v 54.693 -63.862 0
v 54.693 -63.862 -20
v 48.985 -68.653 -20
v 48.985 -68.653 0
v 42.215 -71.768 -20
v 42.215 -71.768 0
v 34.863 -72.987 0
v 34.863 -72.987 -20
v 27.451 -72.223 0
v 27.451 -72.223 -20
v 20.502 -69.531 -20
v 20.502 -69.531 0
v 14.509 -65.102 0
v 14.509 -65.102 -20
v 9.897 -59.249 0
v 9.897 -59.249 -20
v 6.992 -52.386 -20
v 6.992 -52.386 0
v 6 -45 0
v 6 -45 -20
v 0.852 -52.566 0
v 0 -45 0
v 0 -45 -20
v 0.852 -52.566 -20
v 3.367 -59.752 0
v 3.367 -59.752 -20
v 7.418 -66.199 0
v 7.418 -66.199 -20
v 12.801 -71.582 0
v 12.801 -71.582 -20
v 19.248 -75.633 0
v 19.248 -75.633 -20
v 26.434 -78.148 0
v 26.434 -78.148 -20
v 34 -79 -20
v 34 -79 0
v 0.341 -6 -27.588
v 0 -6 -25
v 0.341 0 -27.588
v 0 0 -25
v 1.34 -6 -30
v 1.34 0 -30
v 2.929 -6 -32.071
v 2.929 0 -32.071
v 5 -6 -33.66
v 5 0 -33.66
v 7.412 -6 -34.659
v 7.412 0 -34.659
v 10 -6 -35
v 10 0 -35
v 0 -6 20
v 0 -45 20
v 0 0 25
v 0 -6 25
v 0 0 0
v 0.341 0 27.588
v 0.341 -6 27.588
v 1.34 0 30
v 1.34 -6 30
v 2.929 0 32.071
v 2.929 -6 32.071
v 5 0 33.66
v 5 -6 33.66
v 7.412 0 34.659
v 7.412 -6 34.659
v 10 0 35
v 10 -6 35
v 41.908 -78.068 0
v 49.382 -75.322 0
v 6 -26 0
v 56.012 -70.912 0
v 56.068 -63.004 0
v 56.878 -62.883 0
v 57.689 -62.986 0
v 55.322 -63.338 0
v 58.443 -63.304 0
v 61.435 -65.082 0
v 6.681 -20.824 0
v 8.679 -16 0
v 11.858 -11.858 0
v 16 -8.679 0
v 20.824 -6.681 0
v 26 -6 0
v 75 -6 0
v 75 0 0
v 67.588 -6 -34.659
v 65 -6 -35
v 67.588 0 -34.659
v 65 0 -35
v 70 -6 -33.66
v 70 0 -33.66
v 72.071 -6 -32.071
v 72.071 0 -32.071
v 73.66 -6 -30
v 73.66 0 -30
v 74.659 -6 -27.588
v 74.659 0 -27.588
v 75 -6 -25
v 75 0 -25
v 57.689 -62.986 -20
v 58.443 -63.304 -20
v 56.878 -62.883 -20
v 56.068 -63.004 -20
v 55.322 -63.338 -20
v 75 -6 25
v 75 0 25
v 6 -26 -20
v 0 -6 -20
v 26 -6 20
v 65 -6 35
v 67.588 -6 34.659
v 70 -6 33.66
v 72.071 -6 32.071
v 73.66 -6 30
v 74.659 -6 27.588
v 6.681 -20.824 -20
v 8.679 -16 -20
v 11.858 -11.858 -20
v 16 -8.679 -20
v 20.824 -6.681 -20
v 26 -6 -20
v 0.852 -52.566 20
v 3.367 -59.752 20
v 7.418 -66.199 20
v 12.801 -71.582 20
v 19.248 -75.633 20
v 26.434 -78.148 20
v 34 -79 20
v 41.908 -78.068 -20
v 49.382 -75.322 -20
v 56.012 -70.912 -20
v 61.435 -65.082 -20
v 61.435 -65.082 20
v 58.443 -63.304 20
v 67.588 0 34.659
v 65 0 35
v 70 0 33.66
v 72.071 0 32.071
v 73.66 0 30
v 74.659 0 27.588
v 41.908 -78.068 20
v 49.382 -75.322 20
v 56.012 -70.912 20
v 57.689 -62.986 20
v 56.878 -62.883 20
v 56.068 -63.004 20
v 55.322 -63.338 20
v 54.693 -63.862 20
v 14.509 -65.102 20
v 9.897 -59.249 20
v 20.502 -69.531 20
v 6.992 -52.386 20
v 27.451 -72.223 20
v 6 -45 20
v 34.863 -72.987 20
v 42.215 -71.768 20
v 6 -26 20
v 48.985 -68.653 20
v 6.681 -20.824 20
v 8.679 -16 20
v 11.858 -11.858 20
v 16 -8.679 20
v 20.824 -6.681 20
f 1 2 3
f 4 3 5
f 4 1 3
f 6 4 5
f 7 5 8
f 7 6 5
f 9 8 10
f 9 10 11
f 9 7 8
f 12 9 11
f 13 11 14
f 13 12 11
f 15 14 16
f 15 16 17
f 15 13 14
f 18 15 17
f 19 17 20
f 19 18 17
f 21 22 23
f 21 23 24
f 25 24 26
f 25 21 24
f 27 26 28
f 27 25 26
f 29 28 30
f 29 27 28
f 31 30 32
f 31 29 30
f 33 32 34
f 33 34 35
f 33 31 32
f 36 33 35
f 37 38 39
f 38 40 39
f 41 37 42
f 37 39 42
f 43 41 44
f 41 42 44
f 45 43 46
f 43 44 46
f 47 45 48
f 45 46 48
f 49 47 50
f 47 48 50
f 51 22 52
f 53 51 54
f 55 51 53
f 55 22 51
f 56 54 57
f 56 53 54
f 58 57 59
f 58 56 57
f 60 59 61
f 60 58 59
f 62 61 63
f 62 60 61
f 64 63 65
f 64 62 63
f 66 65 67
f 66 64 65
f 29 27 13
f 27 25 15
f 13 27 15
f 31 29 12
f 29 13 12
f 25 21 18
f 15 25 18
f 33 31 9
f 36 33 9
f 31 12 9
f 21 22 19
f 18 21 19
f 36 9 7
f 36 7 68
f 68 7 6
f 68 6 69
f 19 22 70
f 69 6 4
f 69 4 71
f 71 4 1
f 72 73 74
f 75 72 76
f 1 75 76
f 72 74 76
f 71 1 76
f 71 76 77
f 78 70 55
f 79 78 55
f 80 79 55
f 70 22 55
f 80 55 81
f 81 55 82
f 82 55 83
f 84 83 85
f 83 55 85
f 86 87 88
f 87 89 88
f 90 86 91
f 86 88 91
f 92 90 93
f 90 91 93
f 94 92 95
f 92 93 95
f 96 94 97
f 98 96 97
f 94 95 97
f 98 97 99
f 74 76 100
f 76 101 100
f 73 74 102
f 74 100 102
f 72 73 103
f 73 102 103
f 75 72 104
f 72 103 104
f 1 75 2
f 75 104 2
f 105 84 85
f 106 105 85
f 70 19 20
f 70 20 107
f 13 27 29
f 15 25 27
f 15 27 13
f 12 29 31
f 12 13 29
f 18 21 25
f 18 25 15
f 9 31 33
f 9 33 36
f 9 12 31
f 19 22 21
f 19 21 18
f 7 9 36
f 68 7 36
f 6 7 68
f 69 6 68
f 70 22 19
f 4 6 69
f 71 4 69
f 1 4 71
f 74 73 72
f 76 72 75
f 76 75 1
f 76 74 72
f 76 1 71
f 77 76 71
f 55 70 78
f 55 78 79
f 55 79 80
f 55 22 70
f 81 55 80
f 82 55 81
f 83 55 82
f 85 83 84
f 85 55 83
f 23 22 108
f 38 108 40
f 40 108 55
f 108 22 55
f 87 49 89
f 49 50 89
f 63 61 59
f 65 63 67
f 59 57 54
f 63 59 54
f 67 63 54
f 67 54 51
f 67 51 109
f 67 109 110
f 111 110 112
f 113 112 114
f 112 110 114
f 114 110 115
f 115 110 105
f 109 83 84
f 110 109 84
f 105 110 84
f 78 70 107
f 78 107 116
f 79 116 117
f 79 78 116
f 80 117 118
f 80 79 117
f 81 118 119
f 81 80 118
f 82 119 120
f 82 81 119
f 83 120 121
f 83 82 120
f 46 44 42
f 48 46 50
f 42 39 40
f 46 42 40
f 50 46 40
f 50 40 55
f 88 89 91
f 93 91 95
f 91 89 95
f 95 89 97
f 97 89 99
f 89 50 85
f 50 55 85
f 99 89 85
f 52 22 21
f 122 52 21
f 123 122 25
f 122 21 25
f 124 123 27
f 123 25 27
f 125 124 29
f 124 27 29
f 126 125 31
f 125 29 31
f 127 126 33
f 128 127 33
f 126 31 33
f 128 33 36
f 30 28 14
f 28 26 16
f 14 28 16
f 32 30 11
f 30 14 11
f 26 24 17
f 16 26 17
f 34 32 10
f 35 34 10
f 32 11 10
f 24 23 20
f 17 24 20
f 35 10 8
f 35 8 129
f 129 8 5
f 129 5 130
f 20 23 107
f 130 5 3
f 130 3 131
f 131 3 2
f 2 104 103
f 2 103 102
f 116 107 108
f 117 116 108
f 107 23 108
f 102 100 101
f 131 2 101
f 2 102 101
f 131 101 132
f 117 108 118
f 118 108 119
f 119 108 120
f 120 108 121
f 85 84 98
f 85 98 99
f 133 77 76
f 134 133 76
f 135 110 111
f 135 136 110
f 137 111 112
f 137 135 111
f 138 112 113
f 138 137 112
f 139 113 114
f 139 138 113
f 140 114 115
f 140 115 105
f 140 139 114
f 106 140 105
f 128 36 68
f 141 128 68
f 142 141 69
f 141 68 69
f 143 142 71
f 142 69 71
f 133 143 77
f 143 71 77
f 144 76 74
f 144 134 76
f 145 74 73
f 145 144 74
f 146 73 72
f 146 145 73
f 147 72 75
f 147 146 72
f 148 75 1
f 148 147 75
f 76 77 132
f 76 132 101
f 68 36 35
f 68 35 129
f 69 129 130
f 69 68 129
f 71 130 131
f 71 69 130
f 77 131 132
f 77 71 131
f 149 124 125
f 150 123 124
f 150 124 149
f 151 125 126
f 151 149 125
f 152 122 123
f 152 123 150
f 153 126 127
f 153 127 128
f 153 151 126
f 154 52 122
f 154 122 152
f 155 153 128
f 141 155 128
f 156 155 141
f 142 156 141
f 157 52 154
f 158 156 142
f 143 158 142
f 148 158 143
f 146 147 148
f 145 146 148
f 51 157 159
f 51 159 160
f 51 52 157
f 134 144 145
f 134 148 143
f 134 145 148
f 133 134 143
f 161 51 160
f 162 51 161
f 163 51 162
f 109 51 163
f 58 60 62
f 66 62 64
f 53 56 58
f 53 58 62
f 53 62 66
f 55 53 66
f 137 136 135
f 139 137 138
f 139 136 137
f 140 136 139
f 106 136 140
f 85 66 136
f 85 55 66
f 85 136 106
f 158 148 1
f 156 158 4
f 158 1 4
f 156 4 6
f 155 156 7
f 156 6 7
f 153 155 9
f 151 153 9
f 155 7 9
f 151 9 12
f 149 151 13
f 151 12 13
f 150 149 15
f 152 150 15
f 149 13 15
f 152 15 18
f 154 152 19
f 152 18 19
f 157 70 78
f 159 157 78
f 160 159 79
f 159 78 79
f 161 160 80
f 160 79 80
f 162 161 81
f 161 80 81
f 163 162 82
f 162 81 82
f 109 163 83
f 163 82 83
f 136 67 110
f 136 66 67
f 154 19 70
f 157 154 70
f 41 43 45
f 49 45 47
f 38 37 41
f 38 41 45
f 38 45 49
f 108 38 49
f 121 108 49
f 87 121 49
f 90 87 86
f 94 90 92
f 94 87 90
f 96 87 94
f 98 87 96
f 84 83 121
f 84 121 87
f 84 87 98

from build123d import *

# Parameters (mm, degrees)
F1_DEPTH = 20
F2_W     = 75
F2_H     = 6
F3_DEPTH = 15
F4_R     = 3
F5_R     = 10


with BuildPart() as f1:
    # F0 (on Top) → F1 (new body)
    with BuildSketch(Plane.XY):
        with BuildLine():
            Line((75, -6), (75, 0))
            Line((75, 0), (0, 0))
            Line((0, 0), (0, -45))
            ThreePointArc((0, -45), (9.958369, -69.041631), (34, -79))
            ThreePointArc((34, -79), (49.381904, -75.32156), (61.43549, -65.082178))
            Line((61.43549, -65.082178), (56.248595, -62))
            ThreePointArc((56.248595, -62), (25.026725, -71.523204), (6, -45))
            Line((6, -45), (6, -26))
            ThreePointArc((6, -26), (11.857864, -11.857864), (26, -6))
            Line((26, -6), (75, -6))
        make_face()
    extrude(amount=F1_DEPTH)

    # F2 (on face) → F3 (join)
    with BuildSketch(Plane.XY.offset(20)):
        with Locations((37.5, -3)):
            Rectangle(F2_W, F2_H)
    extrude(amount=F3_DEPTH)

    # F4
    f4_edges = [f1.edges().sort_by_distance(p)[0] for p in [
        (56.248595, -62, 10),
    ]]
    fillet(f4_edges, radius=F4_R)

    # F5
    f5_edges = [f1.edges().sort_by_distance(p)[0] for p in [
        (0, -3, 35),
        (75, -3, 35),
    ]]
    fillet(f5_edges, radius=F5_R)


with BuildPart() as f6_1:
    # F6: instance of F1
    add(f1.part.mirror(Plane.XY))


solid = Compound([f1.part, f6_1.part])
